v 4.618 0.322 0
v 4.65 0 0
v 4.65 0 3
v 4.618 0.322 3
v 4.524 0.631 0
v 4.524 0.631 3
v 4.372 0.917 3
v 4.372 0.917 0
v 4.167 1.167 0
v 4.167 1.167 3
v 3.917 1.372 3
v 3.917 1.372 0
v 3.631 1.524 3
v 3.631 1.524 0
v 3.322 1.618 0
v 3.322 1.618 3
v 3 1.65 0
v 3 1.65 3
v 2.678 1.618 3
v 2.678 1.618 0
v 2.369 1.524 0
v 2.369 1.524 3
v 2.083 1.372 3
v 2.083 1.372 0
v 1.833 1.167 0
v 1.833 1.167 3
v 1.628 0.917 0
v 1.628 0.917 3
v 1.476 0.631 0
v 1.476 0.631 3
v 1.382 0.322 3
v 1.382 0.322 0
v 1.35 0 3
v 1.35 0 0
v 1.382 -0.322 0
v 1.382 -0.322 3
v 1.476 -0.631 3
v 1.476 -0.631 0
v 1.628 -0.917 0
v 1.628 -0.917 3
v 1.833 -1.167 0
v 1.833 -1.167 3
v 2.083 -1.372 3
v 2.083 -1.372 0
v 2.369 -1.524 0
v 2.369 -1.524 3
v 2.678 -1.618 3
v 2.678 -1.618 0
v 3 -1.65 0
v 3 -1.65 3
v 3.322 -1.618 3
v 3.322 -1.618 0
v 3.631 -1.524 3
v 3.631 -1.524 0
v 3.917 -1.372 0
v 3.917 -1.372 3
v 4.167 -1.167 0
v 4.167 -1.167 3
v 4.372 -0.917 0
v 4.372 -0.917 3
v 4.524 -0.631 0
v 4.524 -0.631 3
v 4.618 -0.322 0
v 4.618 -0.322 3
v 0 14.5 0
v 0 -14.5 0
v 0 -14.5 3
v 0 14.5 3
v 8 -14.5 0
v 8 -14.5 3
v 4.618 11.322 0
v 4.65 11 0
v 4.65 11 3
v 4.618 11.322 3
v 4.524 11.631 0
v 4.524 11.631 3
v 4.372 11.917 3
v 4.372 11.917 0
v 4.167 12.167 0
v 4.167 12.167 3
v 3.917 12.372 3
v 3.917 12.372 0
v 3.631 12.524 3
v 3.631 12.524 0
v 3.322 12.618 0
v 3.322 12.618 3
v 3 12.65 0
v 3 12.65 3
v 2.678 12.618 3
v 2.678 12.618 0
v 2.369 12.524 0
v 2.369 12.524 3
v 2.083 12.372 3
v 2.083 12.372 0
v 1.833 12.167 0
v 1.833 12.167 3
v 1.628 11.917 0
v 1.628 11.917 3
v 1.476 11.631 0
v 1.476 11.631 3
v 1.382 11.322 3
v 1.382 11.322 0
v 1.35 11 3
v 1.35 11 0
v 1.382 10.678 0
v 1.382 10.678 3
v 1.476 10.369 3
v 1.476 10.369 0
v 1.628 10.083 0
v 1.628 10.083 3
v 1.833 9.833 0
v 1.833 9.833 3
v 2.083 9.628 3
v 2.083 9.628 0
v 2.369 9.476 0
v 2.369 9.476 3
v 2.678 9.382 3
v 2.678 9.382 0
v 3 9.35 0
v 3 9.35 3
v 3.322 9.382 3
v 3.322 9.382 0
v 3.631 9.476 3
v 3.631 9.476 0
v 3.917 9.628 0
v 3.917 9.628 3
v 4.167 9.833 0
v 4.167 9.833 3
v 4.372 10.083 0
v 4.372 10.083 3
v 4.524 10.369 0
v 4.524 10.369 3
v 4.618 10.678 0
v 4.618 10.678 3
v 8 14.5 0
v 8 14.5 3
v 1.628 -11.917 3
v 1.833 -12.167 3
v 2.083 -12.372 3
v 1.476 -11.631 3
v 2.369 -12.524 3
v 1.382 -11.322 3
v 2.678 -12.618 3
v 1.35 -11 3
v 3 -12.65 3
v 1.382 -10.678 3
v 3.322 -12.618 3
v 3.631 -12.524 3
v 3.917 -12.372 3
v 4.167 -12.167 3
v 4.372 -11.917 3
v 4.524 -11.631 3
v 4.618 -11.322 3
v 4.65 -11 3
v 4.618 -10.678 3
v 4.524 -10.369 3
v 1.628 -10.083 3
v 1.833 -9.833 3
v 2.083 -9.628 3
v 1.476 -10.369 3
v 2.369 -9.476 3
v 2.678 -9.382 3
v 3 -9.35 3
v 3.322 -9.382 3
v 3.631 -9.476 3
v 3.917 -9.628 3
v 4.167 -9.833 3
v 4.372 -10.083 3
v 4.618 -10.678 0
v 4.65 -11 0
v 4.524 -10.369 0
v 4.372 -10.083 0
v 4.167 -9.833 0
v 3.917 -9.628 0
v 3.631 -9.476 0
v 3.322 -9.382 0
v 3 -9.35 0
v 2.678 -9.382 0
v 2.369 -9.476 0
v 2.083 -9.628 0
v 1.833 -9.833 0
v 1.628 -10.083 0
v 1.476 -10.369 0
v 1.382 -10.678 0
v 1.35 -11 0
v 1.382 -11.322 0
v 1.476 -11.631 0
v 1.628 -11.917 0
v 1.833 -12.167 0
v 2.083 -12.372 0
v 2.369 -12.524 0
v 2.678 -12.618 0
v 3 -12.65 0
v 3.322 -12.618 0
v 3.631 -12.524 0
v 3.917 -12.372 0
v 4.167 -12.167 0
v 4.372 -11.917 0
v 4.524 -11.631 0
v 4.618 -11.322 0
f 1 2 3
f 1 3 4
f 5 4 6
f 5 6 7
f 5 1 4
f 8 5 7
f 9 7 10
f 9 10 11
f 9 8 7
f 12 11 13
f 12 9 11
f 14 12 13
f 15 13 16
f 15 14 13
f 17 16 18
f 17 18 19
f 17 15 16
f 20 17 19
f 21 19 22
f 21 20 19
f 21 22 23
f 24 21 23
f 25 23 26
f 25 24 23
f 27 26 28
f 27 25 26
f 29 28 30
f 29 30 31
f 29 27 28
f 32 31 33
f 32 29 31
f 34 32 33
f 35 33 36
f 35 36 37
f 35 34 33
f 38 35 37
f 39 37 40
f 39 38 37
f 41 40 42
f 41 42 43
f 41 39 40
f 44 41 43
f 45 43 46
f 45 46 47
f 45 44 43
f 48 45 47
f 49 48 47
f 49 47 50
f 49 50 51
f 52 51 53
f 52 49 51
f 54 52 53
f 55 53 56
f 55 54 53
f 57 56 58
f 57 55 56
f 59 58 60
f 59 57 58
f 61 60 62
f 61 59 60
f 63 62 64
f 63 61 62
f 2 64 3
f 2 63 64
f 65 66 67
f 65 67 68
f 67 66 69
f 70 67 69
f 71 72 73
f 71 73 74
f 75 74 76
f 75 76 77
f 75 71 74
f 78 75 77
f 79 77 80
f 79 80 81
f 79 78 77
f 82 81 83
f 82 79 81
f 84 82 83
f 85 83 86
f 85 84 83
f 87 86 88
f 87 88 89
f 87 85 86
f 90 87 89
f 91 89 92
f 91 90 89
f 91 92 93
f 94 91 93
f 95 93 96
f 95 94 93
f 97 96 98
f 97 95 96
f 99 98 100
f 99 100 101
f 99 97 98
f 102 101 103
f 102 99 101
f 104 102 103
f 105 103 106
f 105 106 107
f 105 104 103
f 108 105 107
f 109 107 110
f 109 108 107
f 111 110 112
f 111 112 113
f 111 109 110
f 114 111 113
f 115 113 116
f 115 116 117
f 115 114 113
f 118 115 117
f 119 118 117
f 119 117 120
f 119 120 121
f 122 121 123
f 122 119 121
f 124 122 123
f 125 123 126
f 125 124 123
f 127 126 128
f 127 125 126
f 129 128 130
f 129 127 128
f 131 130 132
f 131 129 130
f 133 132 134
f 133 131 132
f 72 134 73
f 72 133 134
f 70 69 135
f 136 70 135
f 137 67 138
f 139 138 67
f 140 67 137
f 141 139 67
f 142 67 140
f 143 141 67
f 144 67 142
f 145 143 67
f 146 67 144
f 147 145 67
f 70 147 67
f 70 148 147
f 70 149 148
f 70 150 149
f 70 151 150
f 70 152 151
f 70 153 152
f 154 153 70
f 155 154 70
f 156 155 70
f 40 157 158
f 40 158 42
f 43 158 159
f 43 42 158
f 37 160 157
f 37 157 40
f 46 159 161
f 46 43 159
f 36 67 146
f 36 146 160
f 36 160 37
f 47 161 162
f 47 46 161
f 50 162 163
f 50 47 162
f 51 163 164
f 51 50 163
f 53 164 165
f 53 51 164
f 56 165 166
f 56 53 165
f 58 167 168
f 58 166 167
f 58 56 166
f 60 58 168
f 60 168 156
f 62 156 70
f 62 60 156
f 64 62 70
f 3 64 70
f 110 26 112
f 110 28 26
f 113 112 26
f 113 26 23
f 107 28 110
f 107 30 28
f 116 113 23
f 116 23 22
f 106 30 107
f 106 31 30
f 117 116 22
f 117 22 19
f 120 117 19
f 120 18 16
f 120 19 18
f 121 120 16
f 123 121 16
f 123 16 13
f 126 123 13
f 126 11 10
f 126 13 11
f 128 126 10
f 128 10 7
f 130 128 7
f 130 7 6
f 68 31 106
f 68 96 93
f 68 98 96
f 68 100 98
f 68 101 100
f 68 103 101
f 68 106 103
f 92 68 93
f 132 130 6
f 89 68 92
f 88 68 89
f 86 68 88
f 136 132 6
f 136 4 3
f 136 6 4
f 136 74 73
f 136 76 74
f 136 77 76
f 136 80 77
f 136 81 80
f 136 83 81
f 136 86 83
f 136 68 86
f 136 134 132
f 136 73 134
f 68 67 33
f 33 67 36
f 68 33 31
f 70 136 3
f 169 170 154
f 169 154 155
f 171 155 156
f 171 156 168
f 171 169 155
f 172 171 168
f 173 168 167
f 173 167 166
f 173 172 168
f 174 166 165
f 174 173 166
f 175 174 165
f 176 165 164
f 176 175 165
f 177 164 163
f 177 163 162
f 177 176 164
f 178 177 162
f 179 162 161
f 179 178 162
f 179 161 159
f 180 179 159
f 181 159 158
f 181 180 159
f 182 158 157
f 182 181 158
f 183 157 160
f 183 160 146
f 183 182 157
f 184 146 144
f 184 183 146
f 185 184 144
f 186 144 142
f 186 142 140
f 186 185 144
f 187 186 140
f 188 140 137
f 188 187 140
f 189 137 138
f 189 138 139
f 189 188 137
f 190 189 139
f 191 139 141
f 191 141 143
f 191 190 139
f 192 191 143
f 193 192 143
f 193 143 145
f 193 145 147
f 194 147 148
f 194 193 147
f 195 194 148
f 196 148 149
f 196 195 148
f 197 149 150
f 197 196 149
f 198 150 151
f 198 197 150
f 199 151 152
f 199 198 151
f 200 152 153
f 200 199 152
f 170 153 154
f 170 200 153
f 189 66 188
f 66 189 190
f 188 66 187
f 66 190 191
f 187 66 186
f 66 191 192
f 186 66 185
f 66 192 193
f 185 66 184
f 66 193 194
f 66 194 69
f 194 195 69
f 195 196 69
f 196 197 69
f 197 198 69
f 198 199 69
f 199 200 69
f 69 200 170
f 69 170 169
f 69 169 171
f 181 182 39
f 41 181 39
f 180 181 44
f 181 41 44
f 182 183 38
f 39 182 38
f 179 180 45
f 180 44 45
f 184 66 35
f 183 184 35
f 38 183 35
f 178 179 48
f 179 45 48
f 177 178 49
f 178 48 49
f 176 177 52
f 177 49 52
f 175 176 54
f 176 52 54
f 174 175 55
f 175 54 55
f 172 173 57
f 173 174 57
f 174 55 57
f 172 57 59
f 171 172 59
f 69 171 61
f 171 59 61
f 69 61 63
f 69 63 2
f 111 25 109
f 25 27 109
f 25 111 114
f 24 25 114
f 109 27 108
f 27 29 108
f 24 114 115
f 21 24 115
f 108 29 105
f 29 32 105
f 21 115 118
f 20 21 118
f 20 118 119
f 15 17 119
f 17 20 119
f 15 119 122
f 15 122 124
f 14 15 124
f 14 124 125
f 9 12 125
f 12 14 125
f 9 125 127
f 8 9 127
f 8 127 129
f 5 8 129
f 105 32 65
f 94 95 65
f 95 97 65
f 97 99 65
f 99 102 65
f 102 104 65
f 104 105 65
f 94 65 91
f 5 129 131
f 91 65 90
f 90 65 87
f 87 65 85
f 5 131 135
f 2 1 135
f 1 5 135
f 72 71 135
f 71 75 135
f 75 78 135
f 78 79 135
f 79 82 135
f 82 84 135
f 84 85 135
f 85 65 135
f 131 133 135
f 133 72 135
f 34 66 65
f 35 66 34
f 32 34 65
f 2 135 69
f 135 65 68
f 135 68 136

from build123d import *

# Parameters (mm, degrees)
ESBO_O1_W                = 8
ESBO_O1_H                = 29
ESBO_O1_R                = 1.65
RESSALTO_EXTRUS_O1_DEPTH = 3


with BuildPart() as part:
    # Esboço1 → Ressalto-extrusão1 (new body)
    with BuildSketch(Plane.XY):
        with Locations((4, 0)):
            Rectangle(ESBO_O1_W, ESBO_O1_H)
        with Locations((3, 11)):
            Circle(ESBO_O1_R, mode=Mode.SUBTRACT)
        with Locations((3, 0)):
            Circle(ESBO_O1_R, mode=Mode.SUBTRACT)
        with Locations((3, -11)):
            Circle(ESBO_O1_R, mode=Mode.SUBTRACT)
    extrude(amount=RESSALTO_EXTRUS_O1_DEPTH)


solid = part.part
